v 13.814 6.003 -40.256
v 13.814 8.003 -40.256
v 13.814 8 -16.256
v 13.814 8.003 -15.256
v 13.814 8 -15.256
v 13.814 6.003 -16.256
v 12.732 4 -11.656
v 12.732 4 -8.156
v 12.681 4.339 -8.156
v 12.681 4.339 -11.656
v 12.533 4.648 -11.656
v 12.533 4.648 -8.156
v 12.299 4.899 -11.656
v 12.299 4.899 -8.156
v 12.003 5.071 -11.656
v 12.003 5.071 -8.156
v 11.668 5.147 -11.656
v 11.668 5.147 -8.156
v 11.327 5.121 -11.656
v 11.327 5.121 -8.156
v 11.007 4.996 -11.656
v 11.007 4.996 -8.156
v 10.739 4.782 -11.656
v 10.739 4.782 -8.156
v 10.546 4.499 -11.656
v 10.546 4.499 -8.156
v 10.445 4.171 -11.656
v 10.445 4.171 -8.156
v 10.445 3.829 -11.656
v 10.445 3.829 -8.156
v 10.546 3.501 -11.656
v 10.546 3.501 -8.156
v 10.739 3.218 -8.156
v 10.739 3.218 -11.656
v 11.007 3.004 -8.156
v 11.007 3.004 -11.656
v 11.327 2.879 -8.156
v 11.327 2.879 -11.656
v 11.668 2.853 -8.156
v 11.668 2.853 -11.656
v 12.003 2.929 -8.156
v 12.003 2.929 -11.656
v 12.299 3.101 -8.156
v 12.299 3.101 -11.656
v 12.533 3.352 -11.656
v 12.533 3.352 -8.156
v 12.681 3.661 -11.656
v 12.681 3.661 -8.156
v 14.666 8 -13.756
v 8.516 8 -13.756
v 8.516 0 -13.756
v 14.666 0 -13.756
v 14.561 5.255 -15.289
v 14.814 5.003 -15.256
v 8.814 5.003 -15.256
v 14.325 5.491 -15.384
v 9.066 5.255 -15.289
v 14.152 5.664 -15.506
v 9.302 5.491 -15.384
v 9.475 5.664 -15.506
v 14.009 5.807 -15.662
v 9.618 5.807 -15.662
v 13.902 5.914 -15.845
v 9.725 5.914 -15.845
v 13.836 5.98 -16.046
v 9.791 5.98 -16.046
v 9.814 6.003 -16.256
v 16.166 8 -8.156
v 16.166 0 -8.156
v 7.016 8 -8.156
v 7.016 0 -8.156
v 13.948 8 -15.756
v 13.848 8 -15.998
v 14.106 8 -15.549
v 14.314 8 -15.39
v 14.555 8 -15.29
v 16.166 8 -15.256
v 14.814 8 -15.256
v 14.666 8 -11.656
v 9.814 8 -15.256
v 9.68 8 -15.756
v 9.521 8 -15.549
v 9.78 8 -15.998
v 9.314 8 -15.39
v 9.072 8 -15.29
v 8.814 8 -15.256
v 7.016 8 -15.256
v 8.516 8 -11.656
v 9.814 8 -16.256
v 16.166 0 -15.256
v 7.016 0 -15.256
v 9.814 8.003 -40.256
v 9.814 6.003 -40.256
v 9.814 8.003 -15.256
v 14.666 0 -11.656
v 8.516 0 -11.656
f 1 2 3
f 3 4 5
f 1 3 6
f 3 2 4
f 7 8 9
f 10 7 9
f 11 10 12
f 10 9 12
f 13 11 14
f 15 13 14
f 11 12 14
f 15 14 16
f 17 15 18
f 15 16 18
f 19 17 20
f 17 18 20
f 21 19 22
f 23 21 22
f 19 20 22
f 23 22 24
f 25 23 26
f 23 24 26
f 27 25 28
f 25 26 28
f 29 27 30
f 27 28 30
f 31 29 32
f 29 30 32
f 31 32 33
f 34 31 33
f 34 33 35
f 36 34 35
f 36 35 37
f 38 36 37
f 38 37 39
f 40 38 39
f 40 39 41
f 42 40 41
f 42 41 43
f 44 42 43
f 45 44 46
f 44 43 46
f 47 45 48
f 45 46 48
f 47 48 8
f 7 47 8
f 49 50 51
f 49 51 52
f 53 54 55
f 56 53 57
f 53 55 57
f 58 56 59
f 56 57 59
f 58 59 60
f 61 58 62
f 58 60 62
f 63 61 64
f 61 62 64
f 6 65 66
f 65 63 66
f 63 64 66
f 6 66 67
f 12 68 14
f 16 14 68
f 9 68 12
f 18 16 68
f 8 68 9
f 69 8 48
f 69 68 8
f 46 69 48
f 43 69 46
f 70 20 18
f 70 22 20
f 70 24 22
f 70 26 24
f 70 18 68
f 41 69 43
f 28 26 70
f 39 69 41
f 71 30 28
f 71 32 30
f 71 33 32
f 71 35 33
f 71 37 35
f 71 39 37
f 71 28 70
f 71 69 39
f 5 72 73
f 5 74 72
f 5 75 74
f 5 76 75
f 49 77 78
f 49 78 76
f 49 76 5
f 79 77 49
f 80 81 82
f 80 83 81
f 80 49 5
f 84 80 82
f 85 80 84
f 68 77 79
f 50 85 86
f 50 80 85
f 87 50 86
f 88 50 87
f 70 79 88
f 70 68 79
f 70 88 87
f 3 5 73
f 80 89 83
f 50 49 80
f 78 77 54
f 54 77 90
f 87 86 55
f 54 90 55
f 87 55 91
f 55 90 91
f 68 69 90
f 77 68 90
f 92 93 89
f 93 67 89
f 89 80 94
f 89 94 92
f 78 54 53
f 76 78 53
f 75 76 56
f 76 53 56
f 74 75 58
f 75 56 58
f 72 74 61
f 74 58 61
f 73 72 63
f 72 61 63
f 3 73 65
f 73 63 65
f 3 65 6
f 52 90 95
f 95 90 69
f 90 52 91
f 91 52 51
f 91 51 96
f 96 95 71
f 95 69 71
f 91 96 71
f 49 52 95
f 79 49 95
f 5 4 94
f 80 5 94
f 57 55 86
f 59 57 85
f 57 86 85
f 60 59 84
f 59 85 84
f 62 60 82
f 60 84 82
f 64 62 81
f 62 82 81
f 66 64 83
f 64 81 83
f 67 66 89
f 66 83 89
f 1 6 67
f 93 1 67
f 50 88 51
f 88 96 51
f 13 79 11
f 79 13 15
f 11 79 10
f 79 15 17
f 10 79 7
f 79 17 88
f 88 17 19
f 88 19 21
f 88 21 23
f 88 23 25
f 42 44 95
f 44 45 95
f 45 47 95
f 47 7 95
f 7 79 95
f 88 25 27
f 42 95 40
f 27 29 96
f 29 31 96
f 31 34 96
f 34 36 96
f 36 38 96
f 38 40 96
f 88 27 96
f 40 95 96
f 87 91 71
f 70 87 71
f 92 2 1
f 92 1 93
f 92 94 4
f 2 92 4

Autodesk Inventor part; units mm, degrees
ref_plane "YZ Plane" through (0, 0, 0) normal (1, 0, 0) x (0, 1, 0)
ref_plane "XZ Plane" through (0, 0, 0) normal (0, 1, 0) x (-1, 0, 0)
ref_plane "XY Plane" through (0, 0, 0) normal (0, 0, 1) x (1, 0, 0)
sketch "Sketch1" plane through (0, 0, 0) normal (0, 1, 0) x (-1, 0, 0)
  line L0 (-14.666, -11.6564) -> (-8.516, -11.6564)
  line L1 (-8.516, -11.6564) -> (-8.516, -13.7564)
  line L2 (-8.516, -13.7564) -> (-14.666, -13.7564)
  line L3 (-14.666, -13.7564) -> (-14.666, -11.6564)
  line L4 (-14.666, -11.6564) -> (-8.516, -13.7564) construction
  line L5 (-8.516, -11.6564) -> (-14.666, -13.7564) construction
  line L6 (-16.166, -15.2564) -> (-7.016, -15.2564)
  line L7 (-7.016, -15.2564) -> (-7.016, -10.1564)
  line L8 (-16.166, -10.1564) -> (-16.166, -15.2564)
  line L9 (-16.166, -8.1564) -> (-7.016, -8.1564)
  line L10 (-7.016, -10.1564) -> (-7.016, -8.1564)
  line L11 (-16.166, -10.1564) -> (-16.166, -8.1564)
  point P0 (0, 0)
  point P1 (-11.591, -12.7064)
  dimension "d0" = 6.15
  dimension "d1" = 2.1
  dimension "d2" = 1.5
extrude "Extrusion1" add sketch "Sketch1" along normal blind 8
sketch "Sketch4" plane through (7.016, 0, -8.1564) normal (0, 0, 1) x (1, 0, 0)
  circle A0 centre (4.5664, 4) radius 1.15
  point P0 (-7.016, 0)
  dimension "d13" = 2.3
extrude "Extrusion4" cut sketch "Sketch4" against normal blind 4
sketch "Sketch5" plane through (16.166, 0, -15.2564) normal (0, 0, -1) x (-1, 0, 0)
  line L0 (2.3524, 6.0027) -> (6.3524, 6.0027)
  line L1 (6.3524, 6.0027) -> (6.3524, 8.0027)
  line L2 (6.3524, 8.0027) -> (2.3524, 8.0027)
  line L3 (2.3524, 8.0027) -> (2.3524, 6.0027)
  line L4 (2.3524, 6.0027) -> (6.3524, 8.0027) construction
  line L5 (6.3524, 6.0027) -> (2.3524, 8.0027) construction
  point P0 (16.166, 0)
  point P1 (4.3524, 7.0027)
  dimension "d16" = 4
  dimension "d17" = 2
extrude "Extrusion5" add sketch "Sketch5" along normal blind 25
fillet "Fillet1" radius 1 3 edges at (11.8136, 6.0027, -15.2564) (9.8136, 7.0014, -15.2564) (13.8136, 7.0014, -15.2564)
thread "Thread1" size "M0.6x0.15" class "6H" standard "ANSI Metric M Profile" full length
properties part number "slider"
